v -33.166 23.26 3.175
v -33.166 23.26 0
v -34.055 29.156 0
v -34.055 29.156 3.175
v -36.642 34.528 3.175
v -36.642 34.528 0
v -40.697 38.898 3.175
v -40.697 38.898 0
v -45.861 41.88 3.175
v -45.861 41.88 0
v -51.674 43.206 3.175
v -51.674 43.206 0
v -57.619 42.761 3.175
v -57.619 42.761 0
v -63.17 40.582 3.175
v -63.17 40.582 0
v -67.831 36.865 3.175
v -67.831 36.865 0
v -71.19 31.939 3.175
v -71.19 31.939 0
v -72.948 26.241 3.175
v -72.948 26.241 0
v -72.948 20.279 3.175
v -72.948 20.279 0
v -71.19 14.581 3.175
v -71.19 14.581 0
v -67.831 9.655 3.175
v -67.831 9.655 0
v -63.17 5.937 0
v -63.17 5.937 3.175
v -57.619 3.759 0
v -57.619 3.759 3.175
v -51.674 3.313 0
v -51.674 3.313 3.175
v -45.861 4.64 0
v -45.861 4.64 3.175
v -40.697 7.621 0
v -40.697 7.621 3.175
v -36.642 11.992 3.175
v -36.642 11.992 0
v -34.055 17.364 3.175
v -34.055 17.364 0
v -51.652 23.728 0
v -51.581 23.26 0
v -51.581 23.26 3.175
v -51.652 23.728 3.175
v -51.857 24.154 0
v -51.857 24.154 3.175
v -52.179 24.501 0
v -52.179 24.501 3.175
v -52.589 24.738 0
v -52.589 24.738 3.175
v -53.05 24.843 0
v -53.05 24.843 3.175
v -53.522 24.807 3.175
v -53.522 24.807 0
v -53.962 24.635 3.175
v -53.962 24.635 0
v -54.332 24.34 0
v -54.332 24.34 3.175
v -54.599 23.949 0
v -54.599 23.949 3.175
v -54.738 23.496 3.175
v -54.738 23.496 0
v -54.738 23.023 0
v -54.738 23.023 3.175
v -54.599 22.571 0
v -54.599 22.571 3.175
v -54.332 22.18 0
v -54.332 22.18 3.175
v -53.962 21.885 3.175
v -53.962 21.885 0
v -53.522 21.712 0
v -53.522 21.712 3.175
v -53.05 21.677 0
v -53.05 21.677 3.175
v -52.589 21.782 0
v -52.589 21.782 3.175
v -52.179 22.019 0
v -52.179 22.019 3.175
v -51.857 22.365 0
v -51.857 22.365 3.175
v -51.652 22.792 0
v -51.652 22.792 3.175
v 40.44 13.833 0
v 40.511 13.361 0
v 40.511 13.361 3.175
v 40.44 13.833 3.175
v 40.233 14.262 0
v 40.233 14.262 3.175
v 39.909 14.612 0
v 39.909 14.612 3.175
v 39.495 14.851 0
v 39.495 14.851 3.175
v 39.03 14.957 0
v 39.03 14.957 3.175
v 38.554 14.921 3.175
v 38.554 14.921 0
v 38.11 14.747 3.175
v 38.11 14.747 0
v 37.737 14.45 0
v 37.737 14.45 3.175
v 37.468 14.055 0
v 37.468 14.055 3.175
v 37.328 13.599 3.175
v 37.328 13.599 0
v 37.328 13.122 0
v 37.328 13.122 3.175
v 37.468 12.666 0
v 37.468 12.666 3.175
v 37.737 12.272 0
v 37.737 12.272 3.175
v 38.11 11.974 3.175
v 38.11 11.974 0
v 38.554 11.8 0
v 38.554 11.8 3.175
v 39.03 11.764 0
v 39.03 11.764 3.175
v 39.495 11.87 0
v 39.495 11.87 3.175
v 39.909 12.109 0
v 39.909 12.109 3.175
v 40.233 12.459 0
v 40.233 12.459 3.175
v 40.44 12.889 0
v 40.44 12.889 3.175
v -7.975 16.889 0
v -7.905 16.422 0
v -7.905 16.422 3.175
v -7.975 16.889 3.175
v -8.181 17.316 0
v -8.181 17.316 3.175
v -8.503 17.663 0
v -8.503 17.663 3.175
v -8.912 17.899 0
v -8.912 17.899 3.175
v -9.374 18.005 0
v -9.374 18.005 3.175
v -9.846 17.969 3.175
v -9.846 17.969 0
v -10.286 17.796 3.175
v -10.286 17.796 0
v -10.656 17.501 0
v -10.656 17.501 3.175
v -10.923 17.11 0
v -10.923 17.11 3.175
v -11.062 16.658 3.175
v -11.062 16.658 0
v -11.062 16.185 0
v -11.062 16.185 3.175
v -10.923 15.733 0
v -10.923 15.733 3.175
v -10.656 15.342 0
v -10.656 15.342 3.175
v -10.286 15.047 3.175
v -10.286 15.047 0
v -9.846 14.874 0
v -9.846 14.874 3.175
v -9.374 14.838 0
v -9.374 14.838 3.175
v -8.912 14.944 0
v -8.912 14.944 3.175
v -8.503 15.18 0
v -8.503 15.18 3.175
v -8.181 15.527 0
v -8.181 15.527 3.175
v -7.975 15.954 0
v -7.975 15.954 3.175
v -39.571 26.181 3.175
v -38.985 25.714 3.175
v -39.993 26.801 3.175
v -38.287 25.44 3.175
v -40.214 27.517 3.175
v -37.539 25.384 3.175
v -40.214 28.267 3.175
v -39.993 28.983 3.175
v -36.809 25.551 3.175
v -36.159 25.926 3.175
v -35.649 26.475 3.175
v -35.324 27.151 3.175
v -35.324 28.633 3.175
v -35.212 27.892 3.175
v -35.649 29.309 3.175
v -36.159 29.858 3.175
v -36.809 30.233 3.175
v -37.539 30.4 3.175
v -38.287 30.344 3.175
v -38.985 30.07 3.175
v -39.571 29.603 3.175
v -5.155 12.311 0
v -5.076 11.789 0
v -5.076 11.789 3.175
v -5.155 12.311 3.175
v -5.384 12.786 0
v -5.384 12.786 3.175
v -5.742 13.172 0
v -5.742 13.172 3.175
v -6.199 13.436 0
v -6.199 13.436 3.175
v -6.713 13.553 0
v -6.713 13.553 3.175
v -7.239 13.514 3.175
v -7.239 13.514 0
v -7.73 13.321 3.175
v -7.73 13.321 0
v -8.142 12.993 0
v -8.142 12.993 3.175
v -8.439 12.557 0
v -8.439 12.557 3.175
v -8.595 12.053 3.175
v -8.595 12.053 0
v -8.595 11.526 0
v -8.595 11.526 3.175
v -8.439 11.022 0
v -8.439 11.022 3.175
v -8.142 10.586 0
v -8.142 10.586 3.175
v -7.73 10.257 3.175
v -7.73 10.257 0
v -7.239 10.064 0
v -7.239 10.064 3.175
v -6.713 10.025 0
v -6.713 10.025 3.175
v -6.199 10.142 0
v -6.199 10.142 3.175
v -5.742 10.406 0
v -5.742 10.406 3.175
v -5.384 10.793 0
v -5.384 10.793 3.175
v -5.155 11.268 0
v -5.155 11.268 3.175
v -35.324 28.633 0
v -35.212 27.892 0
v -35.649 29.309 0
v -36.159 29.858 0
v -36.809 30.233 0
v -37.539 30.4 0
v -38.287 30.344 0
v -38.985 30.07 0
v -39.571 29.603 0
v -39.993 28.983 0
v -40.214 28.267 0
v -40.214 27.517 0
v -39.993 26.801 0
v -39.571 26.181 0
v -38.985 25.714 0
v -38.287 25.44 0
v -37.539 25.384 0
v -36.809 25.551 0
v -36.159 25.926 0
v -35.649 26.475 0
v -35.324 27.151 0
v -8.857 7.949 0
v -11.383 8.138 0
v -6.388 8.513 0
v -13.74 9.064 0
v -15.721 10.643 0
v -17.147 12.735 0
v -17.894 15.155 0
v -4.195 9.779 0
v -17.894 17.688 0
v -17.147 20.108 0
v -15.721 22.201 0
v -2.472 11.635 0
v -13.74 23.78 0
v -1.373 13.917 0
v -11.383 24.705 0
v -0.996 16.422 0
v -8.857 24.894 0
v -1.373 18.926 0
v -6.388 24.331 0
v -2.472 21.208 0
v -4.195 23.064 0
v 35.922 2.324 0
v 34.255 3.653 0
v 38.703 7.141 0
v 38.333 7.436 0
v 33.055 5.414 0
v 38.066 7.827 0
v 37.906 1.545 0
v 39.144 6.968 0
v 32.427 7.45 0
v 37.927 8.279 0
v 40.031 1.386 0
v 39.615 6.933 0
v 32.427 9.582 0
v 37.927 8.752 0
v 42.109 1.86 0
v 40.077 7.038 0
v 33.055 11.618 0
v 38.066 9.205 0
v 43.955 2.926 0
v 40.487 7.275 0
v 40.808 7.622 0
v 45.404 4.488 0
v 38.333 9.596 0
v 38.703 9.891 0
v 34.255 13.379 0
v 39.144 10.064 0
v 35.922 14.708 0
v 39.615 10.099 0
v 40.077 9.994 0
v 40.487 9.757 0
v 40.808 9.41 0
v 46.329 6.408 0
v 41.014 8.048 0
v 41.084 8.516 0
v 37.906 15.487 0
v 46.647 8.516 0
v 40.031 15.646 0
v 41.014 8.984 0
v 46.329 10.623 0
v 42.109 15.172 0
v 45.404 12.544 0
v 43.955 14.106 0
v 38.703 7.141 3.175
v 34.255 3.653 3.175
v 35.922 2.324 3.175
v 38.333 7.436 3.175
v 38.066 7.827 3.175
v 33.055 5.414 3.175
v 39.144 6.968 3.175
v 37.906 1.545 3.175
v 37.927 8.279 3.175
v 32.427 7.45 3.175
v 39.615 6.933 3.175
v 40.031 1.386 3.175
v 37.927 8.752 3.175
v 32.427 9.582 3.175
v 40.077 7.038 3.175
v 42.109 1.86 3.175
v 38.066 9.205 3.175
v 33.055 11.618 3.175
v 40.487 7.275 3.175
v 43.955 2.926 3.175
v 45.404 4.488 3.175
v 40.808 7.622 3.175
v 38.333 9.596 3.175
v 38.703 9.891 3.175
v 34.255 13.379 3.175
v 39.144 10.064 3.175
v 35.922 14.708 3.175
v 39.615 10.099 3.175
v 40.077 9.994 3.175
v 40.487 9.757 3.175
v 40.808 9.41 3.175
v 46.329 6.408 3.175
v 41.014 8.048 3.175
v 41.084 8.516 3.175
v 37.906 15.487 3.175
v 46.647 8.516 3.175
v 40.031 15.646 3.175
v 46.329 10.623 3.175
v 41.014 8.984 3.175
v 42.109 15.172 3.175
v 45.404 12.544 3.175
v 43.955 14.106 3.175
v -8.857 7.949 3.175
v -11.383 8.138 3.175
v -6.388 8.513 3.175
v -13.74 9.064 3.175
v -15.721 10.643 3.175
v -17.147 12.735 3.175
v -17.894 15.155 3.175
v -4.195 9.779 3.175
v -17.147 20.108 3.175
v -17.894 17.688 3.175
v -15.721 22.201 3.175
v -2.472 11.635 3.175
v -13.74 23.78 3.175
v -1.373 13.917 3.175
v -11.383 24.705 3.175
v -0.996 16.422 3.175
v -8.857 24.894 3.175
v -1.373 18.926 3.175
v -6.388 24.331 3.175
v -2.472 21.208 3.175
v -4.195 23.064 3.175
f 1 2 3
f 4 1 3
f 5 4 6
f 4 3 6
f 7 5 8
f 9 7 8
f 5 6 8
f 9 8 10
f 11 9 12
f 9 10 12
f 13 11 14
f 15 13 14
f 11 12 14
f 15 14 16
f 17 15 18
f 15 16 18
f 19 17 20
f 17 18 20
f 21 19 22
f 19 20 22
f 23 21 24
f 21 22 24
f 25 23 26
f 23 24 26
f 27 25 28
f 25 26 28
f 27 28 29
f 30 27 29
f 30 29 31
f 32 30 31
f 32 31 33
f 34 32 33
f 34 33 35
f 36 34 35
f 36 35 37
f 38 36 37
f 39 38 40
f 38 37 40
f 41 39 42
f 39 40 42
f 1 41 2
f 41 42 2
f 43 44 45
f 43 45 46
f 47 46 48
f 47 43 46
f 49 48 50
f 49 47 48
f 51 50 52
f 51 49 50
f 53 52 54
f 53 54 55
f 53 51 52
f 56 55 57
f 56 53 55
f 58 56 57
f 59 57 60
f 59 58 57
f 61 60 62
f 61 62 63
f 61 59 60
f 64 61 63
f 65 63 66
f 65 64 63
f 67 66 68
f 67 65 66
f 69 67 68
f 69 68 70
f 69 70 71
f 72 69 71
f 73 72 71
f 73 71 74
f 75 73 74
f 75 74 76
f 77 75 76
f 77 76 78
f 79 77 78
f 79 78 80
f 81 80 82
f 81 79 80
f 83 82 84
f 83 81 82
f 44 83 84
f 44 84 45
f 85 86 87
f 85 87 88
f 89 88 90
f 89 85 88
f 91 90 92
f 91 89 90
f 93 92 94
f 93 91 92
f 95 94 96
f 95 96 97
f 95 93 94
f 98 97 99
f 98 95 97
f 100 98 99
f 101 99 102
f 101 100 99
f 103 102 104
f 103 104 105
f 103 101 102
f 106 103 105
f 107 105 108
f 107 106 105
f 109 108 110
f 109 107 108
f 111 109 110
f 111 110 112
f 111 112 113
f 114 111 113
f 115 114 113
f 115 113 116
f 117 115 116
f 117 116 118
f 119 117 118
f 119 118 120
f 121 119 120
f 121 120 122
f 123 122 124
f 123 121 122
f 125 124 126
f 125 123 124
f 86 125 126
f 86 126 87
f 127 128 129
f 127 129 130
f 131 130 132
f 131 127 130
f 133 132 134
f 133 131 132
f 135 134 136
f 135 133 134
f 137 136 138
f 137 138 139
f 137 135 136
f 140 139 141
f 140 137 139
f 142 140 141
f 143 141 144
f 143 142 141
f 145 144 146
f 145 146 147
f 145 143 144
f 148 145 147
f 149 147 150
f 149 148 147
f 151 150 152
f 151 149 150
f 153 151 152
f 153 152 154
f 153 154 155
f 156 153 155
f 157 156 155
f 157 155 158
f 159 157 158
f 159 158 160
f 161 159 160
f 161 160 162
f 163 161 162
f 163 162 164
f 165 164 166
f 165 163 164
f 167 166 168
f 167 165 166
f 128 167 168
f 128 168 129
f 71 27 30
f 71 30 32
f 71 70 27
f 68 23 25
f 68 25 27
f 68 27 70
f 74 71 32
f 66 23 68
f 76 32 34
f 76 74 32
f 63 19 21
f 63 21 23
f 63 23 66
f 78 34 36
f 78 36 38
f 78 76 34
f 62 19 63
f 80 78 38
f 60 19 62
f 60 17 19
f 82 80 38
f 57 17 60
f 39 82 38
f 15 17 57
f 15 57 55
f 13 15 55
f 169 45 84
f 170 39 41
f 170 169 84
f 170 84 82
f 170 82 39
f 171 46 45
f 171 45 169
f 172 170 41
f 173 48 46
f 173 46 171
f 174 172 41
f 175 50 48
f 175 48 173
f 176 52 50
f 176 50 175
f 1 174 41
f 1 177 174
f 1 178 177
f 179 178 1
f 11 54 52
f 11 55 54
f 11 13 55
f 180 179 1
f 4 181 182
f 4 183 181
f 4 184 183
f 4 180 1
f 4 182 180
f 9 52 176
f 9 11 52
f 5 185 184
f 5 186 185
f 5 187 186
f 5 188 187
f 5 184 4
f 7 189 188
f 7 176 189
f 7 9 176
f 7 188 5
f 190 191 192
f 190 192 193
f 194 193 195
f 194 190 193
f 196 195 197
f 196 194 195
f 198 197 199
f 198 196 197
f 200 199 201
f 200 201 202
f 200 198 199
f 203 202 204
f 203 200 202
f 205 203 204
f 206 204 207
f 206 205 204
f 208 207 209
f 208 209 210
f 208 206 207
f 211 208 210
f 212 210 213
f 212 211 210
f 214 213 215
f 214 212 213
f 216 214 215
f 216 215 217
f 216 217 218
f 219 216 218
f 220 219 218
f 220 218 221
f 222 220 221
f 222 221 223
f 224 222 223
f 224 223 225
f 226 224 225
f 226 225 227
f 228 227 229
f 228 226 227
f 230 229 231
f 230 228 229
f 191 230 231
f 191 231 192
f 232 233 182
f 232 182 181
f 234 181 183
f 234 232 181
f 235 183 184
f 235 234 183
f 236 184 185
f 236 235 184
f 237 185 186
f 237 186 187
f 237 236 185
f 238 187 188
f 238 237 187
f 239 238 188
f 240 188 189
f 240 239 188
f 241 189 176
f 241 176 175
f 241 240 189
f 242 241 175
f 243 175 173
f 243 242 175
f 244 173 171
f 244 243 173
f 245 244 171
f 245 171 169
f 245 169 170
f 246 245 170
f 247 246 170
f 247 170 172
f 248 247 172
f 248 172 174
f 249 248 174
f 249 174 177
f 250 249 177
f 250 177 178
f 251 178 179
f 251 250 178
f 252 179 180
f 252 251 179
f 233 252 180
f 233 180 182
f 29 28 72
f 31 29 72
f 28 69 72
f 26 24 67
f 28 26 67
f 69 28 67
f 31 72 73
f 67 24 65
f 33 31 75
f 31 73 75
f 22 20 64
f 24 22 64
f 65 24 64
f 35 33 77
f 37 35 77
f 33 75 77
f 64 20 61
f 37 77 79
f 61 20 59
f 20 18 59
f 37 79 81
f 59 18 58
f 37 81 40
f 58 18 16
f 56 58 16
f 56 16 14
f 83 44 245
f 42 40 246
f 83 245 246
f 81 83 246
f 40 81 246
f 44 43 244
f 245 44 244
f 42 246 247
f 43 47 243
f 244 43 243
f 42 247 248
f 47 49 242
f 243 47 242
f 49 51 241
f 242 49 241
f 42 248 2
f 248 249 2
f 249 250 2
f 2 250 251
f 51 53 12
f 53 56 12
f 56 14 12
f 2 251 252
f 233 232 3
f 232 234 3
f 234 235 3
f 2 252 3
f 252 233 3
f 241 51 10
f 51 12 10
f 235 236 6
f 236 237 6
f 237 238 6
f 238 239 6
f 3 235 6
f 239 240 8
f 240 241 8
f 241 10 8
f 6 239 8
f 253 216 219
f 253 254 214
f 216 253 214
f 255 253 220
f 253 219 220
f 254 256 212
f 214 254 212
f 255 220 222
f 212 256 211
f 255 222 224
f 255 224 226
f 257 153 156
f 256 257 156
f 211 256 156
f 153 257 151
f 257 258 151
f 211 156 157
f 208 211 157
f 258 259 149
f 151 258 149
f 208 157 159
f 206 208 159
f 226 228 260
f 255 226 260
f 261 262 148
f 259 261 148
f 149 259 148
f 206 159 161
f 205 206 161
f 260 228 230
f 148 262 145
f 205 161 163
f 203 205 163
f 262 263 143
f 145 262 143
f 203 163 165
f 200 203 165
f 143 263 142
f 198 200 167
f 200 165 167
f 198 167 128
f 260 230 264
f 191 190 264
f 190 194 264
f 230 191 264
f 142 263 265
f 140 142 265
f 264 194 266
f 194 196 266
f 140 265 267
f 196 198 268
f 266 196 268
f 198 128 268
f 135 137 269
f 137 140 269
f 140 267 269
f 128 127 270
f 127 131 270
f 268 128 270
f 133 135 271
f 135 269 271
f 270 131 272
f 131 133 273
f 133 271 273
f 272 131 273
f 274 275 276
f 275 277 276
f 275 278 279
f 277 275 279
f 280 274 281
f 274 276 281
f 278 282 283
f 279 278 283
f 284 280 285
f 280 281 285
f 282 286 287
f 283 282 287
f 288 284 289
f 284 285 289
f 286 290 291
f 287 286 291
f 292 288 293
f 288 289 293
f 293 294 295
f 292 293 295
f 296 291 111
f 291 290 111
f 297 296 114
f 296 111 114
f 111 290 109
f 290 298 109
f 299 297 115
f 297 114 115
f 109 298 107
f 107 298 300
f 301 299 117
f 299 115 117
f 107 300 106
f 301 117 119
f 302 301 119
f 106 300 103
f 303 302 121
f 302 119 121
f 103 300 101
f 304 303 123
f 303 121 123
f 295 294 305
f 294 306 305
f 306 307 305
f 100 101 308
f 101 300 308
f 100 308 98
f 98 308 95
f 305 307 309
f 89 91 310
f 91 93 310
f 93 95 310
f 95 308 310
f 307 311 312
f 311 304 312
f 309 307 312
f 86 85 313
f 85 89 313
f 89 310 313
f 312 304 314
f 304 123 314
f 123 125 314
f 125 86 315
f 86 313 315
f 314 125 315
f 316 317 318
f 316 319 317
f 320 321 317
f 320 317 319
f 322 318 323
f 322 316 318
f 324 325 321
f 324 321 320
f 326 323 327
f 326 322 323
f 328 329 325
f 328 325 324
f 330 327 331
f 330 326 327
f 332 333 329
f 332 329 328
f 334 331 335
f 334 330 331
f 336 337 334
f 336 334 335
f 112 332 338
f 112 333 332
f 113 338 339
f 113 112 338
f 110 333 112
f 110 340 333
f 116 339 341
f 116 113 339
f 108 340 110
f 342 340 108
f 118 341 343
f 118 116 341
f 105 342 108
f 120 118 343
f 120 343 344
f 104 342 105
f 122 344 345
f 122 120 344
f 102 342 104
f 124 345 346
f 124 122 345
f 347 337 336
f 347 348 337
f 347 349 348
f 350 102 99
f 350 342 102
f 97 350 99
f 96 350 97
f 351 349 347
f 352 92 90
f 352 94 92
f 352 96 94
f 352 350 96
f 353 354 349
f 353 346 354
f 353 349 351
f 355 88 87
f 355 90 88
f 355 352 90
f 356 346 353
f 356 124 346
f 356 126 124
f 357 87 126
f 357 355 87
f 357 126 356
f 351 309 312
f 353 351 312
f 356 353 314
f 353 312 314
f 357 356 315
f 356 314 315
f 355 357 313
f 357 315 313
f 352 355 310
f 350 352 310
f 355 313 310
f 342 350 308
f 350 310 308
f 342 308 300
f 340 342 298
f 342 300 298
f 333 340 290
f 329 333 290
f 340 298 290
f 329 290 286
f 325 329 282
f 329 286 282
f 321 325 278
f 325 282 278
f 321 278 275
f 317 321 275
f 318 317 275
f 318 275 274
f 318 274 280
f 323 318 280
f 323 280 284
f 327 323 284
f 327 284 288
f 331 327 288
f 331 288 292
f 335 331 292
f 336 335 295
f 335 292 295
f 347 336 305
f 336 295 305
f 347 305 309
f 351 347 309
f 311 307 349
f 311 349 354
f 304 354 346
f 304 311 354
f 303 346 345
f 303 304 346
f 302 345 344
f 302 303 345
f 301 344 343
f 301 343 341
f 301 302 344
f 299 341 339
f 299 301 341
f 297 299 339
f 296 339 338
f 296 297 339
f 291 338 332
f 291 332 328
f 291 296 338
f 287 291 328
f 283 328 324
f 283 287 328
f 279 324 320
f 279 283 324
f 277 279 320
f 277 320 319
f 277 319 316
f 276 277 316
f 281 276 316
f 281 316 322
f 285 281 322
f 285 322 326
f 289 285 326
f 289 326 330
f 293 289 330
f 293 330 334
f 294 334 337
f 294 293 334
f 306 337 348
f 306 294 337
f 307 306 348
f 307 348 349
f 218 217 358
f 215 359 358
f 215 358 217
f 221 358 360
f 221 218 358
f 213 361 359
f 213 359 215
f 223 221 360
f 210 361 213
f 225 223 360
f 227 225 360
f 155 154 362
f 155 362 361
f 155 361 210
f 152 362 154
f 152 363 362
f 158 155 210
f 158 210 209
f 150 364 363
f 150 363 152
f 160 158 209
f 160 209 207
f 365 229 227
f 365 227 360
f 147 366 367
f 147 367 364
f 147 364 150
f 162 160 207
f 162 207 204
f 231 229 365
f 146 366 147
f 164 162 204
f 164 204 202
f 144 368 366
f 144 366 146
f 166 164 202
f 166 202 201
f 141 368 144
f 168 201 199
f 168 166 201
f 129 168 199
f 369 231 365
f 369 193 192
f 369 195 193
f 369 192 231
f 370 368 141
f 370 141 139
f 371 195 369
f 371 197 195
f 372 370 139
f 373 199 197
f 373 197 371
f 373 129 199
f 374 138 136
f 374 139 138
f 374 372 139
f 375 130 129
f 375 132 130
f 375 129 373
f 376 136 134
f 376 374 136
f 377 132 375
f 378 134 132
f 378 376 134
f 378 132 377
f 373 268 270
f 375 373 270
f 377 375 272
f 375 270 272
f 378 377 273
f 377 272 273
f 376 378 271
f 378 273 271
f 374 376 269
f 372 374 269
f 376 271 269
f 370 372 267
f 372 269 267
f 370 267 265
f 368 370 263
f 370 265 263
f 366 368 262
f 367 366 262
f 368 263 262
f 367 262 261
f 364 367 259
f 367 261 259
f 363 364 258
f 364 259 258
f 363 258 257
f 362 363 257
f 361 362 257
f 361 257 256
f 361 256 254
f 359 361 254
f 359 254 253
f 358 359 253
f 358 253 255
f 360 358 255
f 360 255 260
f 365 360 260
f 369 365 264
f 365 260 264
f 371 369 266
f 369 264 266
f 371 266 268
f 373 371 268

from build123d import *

# Parameters (mm, degrees)
F0_R     = 8.4963
F0_R_2   = 1.769141
F0_R_3   = 1.5875
F0_R_4   = 20.0025
F0_R_5   = 2.515077
F0_R_6   = 7.1501
F0_R_7   = 1.60086
F1_DEPTH = 3.175


with BuildPart() as f1:
    # F0 (on Top) → F1 (new body)
    with BuildSketch(Plane.XY):
        with Locations((-9.492324, 16.42156)):
            Circle(F0_R)
        with Locations((-6.845283, 11.789238)):
            Circle(F0_R_2, mode=Mode.SUBTRACT)
        with Locations((-9.492324, 16.42156)):
            Circle(F0_R_3, mode=Mode.SUBTRACT)
        with Locations((-53.168502, 23.25975)):
            Circle(F0_R_4)
        with Locations((-53.168502, 23.25975)):
            Circle(F0_R_3, mode=Mode.SUBTRACT)
        with Locations((-37.72743, 27.892072)):
            Circle(F0_R_5, mode=Mode.SUBTRACT)
        with Locations((39.496776, 8.515873)):
            Circle(F0_R_6)
        with Locations((39.496776, 8.515873)):
            Circle(F0_R_3, mode=Mode.SUBTRACT)
        with Locations((38.910594, 13.360685)):
            Circle(F0_R_7, mode=Mode.SUBTRACT)
    extrude(amount=F1_DEPTH)


solid = f1.part
